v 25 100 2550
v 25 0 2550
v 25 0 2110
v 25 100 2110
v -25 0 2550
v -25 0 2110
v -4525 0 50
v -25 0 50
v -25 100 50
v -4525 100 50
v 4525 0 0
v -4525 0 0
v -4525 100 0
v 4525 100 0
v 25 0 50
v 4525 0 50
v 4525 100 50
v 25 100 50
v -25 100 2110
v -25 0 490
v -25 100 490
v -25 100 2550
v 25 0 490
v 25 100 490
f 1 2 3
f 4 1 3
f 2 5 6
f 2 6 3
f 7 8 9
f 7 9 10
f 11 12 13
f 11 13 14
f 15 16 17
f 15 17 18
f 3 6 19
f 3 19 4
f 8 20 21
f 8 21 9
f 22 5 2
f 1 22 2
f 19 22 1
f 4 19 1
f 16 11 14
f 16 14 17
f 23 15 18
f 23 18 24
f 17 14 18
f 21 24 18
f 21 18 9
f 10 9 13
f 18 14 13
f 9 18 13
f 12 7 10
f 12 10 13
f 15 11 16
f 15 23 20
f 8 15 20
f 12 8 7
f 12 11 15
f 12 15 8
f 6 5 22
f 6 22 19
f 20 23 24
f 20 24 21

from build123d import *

# Parameters (mm, degrees)
EXTRUDE_1_DEPTH   = 100
SKETCH_1_W        = 50
SKETCH_1_H        = 440
EXTRUDE_1_2_DEPTH = 100


with BuildPart() as part:
    # 草图1 → 凸台-拉伸1 (new body)
    with BuildSketch(Plane(origin=(0, 0, 0), x_dir=(1, 0, 0), z_dir=(0, 1, 0))):
        Polygon((-4525, 0), (4525, 0), (4525, -50), (25, -50), (25, -490), (-25, -490), (-25, -50), (-4525, -50), align=None)
    extrude(amount=EXTRUDE_1_DEPTH)


with BuildPart() as body_2:
    # 草图1 → Extrude 1 2 (new body)
    with BuildSketch(Plane(origin=(0, 0, 0), x_dir=(1, 0, 0), z_dir=(0, 1, 0))):
        with Locations((0, -2330)):
            Rectangle(SKETCH_1_W, SKETCH_1_H)
    extrude(amount=EXTRUDE_1_2_DEPTH)


solid = Compound([part.part, body_2.part])
